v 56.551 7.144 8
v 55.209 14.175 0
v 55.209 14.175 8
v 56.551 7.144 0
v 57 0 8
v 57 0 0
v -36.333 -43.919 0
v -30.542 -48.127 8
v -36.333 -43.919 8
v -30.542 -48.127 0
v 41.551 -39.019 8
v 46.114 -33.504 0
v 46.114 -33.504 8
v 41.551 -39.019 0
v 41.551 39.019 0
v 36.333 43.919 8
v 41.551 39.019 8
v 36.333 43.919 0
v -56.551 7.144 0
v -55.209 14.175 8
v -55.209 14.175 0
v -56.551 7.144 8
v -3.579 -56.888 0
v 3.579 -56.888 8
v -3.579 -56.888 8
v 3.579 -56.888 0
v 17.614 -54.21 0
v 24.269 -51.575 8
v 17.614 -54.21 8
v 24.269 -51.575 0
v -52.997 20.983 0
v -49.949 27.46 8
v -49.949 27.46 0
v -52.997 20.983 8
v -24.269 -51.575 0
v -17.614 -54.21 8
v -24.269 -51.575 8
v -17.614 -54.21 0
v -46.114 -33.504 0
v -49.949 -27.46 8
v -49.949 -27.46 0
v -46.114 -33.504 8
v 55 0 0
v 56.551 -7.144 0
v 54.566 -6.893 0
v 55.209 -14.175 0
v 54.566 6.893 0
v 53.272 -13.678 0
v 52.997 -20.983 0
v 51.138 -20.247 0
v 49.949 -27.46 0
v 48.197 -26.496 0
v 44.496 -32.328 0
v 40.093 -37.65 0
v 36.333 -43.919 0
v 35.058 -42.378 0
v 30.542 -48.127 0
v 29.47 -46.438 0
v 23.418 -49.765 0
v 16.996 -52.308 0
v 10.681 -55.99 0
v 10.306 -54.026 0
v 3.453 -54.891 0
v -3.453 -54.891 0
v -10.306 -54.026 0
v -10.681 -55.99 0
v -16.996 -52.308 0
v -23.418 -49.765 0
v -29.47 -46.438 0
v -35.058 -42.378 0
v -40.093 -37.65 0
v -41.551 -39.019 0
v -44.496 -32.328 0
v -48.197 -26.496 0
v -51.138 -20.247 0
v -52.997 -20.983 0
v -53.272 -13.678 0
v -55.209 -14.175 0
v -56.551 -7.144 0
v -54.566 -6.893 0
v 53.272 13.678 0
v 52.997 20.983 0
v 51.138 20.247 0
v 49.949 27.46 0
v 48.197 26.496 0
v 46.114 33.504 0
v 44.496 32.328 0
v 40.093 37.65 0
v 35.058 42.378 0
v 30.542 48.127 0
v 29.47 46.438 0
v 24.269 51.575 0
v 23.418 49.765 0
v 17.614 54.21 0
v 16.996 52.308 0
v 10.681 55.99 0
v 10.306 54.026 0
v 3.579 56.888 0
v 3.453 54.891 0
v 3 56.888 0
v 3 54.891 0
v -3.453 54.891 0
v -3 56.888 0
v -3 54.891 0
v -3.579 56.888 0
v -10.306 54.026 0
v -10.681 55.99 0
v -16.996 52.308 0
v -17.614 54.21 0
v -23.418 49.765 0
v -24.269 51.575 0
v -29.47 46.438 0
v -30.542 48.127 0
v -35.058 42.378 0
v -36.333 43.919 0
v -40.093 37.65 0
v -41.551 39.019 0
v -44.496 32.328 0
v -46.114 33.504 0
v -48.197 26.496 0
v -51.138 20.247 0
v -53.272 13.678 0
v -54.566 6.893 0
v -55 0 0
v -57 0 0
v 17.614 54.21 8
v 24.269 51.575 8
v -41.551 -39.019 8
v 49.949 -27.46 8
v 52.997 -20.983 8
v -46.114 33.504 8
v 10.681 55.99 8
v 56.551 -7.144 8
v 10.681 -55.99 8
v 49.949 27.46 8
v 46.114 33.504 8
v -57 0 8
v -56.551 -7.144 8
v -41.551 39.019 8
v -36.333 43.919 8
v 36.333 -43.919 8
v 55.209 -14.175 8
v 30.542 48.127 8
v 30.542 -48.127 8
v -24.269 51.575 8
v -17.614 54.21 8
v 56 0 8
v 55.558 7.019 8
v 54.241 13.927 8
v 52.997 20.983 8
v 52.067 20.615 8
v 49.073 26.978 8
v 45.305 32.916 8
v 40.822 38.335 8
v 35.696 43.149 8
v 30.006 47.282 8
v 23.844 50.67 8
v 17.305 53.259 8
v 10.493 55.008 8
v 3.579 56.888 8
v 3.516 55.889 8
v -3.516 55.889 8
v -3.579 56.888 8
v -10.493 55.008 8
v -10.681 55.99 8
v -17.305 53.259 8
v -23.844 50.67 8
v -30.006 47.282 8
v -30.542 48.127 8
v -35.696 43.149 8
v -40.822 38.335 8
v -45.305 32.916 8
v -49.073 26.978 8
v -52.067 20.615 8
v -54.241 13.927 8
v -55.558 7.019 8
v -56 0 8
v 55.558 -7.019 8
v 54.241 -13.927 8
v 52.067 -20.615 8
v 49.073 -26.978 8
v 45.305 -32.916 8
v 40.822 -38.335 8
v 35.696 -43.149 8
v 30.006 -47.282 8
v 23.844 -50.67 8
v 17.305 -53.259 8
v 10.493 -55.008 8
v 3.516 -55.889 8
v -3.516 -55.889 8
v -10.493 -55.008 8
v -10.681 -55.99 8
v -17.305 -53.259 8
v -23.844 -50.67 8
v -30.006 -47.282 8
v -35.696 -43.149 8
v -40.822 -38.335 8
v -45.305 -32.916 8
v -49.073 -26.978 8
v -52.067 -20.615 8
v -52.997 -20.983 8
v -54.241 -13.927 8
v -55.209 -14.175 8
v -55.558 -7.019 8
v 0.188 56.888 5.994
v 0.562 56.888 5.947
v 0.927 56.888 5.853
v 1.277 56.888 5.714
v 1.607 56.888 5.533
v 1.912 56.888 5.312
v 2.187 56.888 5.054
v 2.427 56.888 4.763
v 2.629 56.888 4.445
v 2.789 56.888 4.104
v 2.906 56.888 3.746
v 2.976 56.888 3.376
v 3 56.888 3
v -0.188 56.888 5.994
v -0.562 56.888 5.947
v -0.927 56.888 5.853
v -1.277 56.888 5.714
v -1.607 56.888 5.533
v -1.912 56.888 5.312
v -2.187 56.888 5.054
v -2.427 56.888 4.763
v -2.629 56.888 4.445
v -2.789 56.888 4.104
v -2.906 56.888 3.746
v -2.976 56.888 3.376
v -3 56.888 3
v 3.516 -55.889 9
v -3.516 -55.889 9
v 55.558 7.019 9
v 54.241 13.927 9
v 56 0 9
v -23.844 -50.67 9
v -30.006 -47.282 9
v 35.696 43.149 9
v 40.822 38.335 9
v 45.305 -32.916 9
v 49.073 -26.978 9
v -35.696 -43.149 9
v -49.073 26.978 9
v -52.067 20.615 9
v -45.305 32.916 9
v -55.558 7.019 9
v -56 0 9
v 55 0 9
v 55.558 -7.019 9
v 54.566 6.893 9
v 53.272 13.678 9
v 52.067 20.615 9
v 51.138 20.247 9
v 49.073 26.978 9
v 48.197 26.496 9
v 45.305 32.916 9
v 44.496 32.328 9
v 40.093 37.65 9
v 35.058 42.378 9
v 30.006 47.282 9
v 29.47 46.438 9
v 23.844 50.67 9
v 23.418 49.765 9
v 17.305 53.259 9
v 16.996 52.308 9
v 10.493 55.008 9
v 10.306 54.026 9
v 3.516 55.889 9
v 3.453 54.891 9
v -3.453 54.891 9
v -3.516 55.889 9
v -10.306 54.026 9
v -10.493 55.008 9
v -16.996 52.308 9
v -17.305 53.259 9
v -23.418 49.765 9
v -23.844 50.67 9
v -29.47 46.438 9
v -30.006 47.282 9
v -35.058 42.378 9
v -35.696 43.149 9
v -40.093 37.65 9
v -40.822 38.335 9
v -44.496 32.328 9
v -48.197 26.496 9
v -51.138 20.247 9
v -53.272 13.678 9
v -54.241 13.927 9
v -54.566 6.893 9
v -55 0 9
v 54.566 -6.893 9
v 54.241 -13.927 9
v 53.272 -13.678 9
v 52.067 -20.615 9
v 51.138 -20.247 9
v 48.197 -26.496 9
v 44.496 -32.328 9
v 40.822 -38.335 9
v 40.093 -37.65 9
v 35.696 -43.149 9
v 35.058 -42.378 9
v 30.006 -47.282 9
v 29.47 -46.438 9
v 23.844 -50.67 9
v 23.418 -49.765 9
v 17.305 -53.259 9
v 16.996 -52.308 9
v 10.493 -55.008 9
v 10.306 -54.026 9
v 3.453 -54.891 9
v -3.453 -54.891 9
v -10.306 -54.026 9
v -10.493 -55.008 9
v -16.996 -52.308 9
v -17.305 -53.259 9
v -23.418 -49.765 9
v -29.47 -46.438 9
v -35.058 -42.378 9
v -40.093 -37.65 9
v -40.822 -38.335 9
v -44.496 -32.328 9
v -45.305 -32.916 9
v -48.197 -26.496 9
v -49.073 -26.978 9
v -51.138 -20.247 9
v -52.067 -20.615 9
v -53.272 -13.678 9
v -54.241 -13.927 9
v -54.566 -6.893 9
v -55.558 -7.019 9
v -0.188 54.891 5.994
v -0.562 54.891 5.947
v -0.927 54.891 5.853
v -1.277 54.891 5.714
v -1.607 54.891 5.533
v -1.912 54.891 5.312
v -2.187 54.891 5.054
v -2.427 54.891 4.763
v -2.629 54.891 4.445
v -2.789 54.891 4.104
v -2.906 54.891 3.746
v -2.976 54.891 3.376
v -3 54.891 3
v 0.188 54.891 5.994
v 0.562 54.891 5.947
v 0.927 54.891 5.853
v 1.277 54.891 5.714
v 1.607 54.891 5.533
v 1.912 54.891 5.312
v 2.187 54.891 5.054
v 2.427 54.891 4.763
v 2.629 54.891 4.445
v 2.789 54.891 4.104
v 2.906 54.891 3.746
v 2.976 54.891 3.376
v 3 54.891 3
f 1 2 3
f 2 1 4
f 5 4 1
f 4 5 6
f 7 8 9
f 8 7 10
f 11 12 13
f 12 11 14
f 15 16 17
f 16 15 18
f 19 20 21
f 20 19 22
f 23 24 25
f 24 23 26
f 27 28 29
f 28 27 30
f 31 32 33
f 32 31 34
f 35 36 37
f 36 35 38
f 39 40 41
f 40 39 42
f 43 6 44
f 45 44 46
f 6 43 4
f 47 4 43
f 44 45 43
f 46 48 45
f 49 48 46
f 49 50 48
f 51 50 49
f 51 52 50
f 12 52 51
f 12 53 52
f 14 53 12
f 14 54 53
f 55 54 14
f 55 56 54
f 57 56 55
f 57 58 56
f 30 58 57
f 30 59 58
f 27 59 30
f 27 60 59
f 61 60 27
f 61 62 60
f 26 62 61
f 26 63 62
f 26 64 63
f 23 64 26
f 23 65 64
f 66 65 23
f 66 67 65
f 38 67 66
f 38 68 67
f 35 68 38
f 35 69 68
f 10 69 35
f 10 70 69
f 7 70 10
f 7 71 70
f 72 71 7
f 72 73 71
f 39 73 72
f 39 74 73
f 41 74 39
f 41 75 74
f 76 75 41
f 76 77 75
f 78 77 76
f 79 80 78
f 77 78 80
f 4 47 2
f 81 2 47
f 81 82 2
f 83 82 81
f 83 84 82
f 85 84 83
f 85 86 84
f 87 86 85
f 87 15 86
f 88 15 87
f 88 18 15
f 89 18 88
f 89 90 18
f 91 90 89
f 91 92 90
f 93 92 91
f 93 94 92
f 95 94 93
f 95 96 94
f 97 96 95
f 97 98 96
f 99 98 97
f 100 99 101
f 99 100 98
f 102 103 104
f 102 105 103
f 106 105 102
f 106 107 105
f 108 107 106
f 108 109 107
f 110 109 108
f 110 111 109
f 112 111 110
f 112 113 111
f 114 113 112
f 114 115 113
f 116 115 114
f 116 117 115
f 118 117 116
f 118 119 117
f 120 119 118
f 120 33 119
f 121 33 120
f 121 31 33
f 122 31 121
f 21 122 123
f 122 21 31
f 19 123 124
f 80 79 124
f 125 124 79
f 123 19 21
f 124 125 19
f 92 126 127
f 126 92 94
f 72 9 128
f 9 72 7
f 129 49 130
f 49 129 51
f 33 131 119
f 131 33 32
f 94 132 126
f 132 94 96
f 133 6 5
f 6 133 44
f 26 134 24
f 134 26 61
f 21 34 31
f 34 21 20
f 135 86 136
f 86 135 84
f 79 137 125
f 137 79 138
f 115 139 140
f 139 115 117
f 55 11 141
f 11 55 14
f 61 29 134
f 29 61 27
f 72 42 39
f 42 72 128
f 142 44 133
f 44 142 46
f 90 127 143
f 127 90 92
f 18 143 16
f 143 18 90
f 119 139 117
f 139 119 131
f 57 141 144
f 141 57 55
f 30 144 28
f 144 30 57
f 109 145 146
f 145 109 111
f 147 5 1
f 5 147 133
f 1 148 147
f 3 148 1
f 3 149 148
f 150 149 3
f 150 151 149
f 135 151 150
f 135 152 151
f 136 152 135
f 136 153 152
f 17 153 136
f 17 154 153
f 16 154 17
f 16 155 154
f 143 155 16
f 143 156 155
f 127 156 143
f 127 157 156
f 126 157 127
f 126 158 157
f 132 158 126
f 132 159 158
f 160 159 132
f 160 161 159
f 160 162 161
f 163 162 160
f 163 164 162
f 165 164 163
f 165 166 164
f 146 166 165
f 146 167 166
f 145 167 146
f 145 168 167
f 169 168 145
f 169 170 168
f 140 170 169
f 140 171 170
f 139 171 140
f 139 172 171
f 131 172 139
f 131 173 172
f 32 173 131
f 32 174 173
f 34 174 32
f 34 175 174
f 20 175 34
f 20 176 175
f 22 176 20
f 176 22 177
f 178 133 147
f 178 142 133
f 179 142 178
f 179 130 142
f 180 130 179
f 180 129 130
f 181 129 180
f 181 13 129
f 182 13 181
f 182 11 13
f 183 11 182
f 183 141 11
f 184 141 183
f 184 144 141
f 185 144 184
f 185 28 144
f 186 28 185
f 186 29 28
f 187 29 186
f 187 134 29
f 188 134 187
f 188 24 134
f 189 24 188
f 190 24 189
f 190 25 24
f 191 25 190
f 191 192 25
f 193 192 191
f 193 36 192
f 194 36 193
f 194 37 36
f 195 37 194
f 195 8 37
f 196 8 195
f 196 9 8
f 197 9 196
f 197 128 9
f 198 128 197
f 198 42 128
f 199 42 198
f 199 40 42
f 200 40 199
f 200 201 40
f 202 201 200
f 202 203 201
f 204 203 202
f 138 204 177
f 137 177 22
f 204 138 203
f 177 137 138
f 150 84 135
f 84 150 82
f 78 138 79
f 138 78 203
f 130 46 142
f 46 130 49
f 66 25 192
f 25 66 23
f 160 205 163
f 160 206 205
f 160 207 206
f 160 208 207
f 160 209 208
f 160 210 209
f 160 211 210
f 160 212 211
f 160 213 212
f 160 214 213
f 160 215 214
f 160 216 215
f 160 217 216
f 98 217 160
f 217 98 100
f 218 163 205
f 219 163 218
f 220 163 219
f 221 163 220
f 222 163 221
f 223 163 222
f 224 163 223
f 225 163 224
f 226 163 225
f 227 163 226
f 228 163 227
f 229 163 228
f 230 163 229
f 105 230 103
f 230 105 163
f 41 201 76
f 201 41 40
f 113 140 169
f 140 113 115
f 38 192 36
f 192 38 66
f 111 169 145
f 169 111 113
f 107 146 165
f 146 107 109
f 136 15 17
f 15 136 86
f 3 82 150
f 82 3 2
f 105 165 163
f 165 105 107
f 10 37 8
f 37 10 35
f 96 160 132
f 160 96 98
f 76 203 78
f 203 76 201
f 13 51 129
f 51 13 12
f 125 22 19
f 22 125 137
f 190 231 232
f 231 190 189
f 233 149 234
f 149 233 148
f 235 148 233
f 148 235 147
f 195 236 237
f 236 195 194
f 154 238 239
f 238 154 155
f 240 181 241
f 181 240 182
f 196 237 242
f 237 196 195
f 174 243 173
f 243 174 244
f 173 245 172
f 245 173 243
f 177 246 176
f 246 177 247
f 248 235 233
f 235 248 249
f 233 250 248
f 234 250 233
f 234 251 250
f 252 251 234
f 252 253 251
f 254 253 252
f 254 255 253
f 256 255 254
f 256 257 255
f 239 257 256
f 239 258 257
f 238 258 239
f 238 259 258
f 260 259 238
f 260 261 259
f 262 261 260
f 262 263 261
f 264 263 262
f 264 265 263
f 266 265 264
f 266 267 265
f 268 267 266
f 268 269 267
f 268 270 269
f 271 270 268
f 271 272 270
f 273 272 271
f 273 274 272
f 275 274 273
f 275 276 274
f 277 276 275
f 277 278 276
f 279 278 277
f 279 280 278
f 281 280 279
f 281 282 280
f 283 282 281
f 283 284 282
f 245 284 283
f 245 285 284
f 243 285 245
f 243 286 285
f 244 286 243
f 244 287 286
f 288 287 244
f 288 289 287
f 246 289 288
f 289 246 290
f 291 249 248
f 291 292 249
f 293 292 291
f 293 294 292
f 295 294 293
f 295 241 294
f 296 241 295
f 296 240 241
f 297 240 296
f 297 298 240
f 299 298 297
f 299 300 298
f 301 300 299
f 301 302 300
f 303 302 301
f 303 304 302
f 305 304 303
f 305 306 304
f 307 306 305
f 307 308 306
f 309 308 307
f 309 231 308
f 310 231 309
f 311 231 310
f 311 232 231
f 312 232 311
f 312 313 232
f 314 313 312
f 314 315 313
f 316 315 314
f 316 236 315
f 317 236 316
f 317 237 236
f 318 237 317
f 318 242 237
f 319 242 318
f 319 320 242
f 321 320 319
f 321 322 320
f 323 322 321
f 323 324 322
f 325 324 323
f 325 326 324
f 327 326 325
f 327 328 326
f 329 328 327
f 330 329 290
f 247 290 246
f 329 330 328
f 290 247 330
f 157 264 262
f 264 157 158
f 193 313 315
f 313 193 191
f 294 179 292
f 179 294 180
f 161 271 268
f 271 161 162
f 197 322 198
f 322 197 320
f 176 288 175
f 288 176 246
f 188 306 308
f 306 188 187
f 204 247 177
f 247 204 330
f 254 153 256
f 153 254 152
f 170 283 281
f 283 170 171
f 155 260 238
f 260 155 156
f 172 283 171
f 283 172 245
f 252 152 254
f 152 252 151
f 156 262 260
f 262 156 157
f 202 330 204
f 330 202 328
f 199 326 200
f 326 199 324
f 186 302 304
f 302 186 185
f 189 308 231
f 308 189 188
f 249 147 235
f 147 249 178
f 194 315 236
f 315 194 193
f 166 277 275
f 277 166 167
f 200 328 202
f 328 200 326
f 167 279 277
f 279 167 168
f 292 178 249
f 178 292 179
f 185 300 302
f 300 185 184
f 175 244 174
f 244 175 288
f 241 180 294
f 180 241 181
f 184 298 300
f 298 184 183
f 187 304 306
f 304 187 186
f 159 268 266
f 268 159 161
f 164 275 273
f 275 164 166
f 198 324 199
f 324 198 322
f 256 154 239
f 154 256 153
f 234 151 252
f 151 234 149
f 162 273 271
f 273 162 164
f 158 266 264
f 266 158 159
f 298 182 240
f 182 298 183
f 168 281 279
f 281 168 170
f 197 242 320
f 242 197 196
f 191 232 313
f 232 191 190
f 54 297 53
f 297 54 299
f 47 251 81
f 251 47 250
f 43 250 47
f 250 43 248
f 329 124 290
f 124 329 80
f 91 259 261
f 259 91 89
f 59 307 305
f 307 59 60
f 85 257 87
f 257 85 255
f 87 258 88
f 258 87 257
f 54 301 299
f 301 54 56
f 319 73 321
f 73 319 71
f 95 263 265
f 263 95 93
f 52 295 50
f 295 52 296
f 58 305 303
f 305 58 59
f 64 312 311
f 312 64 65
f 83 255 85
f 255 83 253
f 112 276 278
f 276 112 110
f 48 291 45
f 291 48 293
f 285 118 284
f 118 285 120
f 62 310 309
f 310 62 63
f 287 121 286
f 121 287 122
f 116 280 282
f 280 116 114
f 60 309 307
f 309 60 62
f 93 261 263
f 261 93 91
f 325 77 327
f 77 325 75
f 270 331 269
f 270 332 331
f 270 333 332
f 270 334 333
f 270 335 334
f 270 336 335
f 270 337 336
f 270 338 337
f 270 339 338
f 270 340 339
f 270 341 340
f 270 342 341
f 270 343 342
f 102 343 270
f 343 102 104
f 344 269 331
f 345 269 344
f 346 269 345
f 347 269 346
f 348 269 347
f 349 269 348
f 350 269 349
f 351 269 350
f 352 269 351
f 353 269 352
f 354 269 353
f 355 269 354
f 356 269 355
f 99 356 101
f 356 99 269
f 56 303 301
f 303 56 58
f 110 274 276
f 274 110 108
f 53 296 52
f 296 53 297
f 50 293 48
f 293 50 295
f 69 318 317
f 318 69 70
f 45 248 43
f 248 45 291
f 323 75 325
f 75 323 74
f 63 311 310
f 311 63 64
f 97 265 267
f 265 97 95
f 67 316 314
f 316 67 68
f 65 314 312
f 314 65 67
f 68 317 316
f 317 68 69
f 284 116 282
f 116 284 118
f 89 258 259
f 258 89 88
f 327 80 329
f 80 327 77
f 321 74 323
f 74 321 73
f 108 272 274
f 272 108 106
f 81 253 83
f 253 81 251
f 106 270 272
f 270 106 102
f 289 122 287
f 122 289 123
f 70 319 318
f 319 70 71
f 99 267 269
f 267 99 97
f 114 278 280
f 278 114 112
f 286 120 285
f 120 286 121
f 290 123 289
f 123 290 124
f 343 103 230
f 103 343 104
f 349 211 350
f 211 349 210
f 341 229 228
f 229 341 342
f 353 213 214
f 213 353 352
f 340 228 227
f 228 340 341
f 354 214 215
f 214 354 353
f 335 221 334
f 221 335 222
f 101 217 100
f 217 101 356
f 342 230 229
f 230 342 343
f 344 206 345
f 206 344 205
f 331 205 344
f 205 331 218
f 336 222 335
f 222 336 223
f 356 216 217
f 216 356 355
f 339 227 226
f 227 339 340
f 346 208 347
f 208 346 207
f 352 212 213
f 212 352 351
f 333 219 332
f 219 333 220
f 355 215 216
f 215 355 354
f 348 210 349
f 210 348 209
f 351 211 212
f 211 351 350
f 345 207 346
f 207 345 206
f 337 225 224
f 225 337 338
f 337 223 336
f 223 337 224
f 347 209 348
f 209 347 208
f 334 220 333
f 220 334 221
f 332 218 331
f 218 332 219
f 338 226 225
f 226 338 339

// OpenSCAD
//ABB_peitelevyn_AK1.1P_koroke
// 2017-12-17
wire=6;
height=wire+2;
wall=2;
$fn=50;



difference(){
    union(){
    cylinder(r=114/2, h=height);
    cylinder(r=112/2, h=height+1);
    }
    translate([0,0,-1])
    cylinder(r=114/2-wall, h=height+3);
    translate([0,114/2+10,wire/2])
    rotate([90,0,0])
    hull(){
        cylinder(r=wire/2, h=20);
        translate([0,-wire,0])
        cylinder(r=wire/2, h=20);
    }
}
